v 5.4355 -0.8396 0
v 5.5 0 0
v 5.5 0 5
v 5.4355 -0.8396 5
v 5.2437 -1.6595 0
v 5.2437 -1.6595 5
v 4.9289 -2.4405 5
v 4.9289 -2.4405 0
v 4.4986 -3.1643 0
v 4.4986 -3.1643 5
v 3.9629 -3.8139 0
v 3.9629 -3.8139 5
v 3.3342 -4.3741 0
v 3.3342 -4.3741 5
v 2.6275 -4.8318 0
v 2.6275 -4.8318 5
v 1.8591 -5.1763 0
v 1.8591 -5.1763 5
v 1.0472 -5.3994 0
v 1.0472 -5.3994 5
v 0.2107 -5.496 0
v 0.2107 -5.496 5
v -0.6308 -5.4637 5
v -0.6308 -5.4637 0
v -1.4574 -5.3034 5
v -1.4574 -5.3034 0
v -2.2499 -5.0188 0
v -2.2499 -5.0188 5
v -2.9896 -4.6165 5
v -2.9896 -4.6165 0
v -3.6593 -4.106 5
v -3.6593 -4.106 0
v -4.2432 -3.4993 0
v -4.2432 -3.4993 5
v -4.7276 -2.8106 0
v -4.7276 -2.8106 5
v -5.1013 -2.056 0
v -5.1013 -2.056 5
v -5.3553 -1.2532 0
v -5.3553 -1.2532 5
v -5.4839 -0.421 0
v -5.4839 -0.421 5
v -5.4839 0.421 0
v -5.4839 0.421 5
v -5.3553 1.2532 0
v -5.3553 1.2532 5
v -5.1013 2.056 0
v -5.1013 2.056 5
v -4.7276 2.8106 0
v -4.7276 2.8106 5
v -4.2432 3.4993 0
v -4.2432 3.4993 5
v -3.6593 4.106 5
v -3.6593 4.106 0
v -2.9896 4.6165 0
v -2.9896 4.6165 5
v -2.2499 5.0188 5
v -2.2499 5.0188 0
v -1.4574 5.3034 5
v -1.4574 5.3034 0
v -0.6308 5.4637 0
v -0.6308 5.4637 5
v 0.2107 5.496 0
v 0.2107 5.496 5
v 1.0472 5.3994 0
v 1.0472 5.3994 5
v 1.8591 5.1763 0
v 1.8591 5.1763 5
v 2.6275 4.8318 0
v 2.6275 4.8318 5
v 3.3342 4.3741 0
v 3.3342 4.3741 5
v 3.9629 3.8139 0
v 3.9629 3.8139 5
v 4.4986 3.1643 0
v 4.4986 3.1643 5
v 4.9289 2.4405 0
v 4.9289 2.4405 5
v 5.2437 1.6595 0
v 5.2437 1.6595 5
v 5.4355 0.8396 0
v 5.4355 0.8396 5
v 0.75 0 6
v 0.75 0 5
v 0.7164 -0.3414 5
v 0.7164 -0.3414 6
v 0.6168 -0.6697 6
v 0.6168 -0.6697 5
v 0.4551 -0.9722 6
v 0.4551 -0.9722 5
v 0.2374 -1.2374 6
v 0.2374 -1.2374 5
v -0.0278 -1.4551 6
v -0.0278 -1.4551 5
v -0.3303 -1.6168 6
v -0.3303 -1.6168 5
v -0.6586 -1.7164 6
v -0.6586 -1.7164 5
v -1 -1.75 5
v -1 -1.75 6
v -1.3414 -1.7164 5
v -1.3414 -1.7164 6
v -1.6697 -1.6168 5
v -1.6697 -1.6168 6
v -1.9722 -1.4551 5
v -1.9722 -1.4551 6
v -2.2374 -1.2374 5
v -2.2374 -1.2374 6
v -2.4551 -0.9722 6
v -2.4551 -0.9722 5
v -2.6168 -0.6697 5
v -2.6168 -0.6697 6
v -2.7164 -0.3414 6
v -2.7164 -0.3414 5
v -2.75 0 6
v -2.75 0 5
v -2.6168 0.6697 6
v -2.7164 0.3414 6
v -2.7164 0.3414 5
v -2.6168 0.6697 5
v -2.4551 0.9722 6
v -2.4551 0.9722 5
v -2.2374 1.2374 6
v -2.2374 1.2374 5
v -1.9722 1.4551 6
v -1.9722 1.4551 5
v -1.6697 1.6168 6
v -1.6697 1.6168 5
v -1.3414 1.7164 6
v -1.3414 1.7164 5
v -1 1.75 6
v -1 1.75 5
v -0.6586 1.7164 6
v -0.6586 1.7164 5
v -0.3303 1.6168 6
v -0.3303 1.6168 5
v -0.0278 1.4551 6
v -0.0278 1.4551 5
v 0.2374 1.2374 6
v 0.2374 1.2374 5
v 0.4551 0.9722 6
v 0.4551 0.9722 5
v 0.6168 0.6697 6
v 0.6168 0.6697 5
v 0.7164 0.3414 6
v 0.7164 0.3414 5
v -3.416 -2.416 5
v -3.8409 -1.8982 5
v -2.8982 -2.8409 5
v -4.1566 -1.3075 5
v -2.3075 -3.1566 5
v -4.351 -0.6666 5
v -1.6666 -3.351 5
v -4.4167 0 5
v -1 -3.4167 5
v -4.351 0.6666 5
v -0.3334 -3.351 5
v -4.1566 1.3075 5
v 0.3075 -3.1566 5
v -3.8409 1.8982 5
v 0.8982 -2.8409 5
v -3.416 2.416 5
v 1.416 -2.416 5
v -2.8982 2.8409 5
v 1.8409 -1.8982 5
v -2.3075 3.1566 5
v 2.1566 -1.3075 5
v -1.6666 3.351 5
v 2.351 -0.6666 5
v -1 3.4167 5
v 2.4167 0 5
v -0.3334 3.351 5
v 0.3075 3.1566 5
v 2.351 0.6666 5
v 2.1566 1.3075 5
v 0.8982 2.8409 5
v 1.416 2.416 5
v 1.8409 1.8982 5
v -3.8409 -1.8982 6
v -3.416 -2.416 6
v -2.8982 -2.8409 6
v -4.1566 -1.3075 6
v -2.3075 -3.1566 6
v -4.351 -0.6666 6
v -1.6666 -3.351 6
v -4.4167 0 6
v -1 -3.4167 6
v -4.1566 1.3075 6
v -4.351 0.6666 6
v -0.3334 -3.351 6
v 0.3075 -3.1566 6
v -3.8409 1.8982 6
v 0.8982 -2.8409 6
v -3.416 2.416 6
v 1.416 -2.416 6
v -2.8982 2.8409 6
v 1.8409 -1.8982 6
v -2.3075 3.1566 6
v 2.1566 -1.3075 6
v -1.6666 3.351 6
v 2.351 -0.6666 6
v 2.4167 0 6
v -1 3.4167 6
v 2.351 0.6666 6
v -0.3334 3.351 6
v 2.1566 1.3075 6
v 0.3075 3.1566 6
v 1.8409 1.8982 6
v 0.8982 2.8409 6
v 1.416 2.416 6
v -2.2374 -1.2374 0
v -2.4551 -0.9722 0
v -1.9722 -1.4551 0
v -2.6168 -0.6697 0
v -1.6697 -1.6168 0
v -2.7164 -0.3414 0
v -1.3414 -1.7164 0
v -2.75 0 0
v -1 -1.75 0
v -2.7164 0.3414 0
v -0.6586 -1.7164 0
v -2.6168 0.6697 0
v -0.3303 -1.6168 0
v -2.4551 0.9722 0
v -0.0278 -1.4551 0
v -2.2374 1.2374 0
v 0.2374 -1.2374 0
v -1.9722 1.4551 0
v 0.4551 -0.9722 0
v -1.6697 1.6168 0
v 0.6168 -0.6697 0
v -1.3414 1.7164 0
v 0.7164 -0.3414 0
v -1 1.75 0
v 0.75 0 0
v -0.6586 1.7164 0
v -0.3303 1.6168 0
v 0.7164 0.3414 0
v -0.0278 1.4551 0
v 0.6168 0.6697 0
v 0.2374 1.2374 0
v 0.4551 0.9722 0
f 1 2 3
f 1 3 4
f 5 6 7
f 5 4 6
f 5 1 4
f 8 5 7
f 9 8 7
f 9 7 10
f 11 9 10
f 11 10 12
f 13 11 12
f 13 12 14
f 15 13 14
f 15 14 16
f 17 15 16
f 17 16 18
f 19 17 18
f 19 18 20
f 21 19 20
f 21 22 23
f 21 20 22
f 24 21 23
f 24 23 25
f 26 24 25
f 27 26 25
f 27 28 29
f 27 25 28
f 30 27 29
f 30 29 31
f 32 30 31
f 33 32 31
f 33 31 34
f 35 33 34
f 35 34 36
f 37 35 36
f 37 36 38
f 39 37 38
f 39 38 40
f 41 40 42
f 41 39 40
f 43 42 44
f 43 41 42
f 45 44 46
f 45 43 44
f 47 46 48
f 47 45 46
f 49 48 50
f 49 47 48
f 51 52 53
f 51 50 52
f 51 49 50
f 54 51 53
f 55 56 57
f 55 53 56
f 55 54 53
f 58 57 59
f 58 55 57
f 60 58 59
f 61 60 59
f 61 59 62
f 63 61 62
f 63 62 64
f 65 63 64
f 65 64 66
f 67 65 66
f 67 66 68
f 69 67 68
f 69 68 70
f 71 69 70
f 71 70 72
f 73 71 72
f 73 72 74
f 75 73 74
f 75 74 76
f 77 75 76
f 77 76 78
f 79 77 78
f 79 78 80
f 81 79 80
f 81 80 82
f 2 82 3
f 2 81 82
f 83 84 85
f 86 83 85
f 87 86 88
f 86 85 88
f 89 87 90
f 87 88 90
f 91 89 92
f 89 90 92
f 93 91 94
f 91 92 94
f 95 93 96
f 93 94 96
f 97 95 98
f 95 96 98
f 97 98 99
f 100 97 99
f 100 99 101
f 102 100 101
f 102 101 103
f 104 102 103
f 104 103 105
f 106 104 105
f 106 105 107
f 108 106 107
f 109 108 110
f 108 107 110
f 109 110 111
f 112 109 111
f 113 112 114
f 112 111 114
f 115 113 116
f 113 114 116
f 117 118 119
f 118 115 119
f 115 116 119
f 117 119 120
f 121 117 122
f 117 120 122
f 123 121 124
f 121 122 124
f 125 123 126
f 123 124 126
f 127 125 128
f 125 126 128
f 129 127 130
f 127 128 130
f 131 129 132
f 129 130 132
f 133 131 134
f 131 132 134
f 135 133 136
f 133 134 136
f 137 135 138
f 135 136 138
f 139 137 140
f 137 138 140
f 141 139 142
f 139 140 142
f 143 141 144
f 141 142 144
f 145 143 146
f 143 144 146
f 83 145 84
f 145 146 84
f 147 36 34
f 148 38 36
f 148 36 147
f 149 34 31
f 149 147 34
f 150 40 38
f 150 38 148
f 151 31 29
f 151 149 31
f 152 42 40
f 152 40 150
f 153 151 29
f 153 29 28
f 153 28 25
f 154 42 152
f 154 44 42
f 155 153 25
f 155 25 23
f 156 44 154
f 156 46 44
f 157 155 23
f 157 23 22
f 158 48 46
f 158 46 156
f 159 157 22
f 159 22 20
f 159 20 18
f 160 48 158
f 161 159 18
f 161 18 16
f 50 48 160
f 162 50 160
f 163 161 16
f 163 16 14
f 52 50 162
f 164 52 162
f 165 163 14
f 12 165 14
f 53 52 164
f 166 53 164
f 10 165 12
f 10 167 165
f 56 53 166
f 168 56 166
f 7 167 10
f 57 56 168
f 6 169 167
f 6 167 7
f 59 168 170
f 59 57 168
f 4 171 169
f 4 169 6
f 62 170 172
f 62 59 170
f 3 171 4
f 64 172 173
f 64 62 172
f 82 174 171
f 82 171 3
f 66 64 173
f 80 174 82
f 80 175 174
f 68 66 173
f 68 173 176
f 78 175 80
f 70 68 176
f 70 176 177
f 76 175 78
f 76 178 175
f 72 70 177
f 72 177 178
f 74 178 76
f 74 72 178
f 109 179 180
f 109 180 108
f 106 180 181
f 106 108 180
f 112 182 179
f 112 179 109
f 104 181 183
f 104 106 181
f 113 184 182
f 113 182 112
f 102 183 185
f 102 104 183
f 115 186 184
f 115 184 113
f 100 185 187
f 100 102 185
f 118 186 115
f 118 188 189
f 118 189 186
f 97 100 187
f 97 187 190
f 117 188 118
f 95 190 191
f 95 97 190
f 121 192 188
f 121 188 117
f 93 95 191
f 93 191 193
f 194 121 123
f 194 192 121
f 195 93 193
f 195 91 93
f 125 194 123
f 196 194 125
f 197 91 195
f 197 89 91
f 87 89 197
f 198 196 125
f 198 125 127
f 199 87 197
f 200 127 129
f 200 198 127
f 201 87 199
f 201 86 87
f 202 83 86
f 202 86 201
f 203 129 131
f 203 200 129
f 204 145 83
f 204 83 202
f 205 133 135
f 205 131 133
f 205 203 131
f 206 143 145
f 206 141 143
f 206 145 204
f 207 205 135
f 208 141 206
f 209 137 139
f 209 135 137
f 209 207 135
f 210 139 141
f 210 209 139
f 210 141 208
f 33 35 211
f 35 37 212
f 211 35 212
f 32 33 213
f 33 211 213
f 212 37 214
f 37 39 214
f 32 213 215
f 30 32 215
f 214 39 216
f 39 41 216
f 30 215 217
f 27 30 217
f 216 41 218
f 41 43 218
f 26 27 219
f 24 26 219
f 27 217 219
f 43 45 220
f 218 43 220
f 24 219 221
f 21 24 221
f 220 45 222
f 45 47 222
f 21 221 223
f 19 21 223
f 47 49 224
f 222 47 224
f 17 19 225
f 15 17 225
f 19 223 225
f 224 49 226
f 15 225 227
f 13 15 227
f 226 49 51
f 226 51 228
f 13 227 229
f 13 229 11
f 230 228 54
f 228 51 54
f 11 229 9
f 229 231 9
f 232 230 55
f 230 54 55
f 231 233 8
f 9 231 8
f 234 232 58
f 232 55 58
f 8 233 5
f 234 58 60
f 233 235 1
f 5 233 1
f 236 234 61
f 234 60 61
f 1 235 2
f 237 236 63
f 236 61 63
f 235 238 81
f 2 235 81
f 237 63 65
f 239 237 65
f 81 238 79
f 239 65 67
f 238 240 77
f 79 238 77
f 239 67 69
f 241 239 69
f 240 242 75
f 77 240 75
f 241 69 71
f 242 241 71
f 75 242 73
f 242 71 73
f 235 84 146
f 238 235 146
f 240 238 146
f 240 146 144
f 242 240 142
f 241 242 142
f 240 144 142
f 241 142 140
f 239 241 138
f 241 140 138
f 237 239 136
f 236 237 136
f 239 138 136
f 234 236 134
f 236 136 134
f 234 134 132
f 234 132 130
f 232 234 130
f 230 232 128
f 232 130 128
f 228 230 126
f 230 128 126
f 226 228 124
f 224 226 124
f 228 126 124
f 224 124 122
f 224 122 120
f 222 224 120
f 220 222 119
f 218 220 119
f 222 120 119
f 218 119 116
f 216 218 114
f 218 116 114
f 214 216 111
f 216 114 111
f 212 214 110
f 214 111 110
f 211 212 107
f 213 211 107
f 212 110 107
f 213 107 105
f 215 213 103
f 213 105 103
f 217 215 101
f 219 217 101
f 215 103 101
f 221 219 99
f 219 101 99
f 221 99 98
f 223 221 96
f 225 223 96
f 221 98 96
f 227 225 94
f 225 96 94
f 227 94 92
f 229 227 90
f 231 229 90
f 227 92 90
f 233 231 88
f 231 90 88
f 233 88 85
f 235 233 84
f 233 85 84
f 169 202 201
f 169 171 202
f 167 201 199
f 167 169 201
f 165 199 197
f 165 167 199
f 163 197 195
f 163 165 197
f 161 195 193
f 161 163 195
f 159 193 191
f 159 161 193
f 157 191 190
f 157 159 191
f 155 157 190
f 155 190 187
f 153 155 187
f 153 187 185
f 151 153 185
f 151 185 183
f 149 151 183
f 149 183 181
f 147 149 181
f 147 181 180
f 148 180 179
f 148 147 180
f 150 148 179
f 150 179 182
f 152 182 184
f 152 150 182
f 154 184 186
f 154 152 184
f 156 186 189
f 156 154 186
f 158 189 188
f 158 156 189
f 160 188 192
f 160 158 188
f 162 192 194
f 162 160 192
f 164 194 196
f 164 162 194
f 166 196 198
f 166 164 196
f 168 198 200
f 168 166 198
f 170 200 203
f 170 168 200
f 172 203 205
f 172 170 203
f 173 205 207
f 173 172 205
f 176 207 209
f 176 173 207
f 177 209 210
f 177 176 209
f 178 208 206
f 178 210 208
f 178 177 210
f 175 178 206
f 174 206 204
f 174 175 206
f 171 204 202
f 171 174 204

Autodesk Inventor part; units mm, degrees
ref_plane "YZ Plane" through (0, 0, 0) normal (1, 0, 0) x (0, 1, 0)
ref_plane "XZ Plane" through (0, 0, 0) normal (0, 1, 0) x (-1, 0, 0)
ref_plane "XY Plane" through (0, 0, 0) normal (0, 0, 1) x (1, 0, 0)
sketch "Sketch1" plane through (0, 0, 0) normal (0, 0, 1) x (1, 0, 0)
  circle A0 centre (0, 0) radius 5.5
  dimension "d0" = 11
extrude "Extrusion1" add sketch "Sketch1" along normal blind 5
sketch "Sketch2" plane through (0, 0, 5) normal (0, 0, 1) x (1, 0, 0)
  circle A0 centre (0, 0) radius 5.5 projected
  line L0 (0, 0) -> (-1, 0)
  circle A1 centre (-1, 0) radius 1.75
  circle A2 centre (-1, 0) radius 3.4167
  dimension "d5" = 1
  dimension "d6" = 3.5
  dimension "d7" = 1.6667
extrude "Extrusion2" add sketch "Sketch2" along normal blind 1 contours A2
sketch "Sketch3" plane through (-1, 0, 5) normal (0, 0, 1) x (1, 0, 0)
  circle A0 centre (0, 0) radius 1.75 projected
  point P0 (1, 0)
extrude "Extrusion3" cut sketch "Sketch3" against normal through all
properties part number "eccentric stop"
